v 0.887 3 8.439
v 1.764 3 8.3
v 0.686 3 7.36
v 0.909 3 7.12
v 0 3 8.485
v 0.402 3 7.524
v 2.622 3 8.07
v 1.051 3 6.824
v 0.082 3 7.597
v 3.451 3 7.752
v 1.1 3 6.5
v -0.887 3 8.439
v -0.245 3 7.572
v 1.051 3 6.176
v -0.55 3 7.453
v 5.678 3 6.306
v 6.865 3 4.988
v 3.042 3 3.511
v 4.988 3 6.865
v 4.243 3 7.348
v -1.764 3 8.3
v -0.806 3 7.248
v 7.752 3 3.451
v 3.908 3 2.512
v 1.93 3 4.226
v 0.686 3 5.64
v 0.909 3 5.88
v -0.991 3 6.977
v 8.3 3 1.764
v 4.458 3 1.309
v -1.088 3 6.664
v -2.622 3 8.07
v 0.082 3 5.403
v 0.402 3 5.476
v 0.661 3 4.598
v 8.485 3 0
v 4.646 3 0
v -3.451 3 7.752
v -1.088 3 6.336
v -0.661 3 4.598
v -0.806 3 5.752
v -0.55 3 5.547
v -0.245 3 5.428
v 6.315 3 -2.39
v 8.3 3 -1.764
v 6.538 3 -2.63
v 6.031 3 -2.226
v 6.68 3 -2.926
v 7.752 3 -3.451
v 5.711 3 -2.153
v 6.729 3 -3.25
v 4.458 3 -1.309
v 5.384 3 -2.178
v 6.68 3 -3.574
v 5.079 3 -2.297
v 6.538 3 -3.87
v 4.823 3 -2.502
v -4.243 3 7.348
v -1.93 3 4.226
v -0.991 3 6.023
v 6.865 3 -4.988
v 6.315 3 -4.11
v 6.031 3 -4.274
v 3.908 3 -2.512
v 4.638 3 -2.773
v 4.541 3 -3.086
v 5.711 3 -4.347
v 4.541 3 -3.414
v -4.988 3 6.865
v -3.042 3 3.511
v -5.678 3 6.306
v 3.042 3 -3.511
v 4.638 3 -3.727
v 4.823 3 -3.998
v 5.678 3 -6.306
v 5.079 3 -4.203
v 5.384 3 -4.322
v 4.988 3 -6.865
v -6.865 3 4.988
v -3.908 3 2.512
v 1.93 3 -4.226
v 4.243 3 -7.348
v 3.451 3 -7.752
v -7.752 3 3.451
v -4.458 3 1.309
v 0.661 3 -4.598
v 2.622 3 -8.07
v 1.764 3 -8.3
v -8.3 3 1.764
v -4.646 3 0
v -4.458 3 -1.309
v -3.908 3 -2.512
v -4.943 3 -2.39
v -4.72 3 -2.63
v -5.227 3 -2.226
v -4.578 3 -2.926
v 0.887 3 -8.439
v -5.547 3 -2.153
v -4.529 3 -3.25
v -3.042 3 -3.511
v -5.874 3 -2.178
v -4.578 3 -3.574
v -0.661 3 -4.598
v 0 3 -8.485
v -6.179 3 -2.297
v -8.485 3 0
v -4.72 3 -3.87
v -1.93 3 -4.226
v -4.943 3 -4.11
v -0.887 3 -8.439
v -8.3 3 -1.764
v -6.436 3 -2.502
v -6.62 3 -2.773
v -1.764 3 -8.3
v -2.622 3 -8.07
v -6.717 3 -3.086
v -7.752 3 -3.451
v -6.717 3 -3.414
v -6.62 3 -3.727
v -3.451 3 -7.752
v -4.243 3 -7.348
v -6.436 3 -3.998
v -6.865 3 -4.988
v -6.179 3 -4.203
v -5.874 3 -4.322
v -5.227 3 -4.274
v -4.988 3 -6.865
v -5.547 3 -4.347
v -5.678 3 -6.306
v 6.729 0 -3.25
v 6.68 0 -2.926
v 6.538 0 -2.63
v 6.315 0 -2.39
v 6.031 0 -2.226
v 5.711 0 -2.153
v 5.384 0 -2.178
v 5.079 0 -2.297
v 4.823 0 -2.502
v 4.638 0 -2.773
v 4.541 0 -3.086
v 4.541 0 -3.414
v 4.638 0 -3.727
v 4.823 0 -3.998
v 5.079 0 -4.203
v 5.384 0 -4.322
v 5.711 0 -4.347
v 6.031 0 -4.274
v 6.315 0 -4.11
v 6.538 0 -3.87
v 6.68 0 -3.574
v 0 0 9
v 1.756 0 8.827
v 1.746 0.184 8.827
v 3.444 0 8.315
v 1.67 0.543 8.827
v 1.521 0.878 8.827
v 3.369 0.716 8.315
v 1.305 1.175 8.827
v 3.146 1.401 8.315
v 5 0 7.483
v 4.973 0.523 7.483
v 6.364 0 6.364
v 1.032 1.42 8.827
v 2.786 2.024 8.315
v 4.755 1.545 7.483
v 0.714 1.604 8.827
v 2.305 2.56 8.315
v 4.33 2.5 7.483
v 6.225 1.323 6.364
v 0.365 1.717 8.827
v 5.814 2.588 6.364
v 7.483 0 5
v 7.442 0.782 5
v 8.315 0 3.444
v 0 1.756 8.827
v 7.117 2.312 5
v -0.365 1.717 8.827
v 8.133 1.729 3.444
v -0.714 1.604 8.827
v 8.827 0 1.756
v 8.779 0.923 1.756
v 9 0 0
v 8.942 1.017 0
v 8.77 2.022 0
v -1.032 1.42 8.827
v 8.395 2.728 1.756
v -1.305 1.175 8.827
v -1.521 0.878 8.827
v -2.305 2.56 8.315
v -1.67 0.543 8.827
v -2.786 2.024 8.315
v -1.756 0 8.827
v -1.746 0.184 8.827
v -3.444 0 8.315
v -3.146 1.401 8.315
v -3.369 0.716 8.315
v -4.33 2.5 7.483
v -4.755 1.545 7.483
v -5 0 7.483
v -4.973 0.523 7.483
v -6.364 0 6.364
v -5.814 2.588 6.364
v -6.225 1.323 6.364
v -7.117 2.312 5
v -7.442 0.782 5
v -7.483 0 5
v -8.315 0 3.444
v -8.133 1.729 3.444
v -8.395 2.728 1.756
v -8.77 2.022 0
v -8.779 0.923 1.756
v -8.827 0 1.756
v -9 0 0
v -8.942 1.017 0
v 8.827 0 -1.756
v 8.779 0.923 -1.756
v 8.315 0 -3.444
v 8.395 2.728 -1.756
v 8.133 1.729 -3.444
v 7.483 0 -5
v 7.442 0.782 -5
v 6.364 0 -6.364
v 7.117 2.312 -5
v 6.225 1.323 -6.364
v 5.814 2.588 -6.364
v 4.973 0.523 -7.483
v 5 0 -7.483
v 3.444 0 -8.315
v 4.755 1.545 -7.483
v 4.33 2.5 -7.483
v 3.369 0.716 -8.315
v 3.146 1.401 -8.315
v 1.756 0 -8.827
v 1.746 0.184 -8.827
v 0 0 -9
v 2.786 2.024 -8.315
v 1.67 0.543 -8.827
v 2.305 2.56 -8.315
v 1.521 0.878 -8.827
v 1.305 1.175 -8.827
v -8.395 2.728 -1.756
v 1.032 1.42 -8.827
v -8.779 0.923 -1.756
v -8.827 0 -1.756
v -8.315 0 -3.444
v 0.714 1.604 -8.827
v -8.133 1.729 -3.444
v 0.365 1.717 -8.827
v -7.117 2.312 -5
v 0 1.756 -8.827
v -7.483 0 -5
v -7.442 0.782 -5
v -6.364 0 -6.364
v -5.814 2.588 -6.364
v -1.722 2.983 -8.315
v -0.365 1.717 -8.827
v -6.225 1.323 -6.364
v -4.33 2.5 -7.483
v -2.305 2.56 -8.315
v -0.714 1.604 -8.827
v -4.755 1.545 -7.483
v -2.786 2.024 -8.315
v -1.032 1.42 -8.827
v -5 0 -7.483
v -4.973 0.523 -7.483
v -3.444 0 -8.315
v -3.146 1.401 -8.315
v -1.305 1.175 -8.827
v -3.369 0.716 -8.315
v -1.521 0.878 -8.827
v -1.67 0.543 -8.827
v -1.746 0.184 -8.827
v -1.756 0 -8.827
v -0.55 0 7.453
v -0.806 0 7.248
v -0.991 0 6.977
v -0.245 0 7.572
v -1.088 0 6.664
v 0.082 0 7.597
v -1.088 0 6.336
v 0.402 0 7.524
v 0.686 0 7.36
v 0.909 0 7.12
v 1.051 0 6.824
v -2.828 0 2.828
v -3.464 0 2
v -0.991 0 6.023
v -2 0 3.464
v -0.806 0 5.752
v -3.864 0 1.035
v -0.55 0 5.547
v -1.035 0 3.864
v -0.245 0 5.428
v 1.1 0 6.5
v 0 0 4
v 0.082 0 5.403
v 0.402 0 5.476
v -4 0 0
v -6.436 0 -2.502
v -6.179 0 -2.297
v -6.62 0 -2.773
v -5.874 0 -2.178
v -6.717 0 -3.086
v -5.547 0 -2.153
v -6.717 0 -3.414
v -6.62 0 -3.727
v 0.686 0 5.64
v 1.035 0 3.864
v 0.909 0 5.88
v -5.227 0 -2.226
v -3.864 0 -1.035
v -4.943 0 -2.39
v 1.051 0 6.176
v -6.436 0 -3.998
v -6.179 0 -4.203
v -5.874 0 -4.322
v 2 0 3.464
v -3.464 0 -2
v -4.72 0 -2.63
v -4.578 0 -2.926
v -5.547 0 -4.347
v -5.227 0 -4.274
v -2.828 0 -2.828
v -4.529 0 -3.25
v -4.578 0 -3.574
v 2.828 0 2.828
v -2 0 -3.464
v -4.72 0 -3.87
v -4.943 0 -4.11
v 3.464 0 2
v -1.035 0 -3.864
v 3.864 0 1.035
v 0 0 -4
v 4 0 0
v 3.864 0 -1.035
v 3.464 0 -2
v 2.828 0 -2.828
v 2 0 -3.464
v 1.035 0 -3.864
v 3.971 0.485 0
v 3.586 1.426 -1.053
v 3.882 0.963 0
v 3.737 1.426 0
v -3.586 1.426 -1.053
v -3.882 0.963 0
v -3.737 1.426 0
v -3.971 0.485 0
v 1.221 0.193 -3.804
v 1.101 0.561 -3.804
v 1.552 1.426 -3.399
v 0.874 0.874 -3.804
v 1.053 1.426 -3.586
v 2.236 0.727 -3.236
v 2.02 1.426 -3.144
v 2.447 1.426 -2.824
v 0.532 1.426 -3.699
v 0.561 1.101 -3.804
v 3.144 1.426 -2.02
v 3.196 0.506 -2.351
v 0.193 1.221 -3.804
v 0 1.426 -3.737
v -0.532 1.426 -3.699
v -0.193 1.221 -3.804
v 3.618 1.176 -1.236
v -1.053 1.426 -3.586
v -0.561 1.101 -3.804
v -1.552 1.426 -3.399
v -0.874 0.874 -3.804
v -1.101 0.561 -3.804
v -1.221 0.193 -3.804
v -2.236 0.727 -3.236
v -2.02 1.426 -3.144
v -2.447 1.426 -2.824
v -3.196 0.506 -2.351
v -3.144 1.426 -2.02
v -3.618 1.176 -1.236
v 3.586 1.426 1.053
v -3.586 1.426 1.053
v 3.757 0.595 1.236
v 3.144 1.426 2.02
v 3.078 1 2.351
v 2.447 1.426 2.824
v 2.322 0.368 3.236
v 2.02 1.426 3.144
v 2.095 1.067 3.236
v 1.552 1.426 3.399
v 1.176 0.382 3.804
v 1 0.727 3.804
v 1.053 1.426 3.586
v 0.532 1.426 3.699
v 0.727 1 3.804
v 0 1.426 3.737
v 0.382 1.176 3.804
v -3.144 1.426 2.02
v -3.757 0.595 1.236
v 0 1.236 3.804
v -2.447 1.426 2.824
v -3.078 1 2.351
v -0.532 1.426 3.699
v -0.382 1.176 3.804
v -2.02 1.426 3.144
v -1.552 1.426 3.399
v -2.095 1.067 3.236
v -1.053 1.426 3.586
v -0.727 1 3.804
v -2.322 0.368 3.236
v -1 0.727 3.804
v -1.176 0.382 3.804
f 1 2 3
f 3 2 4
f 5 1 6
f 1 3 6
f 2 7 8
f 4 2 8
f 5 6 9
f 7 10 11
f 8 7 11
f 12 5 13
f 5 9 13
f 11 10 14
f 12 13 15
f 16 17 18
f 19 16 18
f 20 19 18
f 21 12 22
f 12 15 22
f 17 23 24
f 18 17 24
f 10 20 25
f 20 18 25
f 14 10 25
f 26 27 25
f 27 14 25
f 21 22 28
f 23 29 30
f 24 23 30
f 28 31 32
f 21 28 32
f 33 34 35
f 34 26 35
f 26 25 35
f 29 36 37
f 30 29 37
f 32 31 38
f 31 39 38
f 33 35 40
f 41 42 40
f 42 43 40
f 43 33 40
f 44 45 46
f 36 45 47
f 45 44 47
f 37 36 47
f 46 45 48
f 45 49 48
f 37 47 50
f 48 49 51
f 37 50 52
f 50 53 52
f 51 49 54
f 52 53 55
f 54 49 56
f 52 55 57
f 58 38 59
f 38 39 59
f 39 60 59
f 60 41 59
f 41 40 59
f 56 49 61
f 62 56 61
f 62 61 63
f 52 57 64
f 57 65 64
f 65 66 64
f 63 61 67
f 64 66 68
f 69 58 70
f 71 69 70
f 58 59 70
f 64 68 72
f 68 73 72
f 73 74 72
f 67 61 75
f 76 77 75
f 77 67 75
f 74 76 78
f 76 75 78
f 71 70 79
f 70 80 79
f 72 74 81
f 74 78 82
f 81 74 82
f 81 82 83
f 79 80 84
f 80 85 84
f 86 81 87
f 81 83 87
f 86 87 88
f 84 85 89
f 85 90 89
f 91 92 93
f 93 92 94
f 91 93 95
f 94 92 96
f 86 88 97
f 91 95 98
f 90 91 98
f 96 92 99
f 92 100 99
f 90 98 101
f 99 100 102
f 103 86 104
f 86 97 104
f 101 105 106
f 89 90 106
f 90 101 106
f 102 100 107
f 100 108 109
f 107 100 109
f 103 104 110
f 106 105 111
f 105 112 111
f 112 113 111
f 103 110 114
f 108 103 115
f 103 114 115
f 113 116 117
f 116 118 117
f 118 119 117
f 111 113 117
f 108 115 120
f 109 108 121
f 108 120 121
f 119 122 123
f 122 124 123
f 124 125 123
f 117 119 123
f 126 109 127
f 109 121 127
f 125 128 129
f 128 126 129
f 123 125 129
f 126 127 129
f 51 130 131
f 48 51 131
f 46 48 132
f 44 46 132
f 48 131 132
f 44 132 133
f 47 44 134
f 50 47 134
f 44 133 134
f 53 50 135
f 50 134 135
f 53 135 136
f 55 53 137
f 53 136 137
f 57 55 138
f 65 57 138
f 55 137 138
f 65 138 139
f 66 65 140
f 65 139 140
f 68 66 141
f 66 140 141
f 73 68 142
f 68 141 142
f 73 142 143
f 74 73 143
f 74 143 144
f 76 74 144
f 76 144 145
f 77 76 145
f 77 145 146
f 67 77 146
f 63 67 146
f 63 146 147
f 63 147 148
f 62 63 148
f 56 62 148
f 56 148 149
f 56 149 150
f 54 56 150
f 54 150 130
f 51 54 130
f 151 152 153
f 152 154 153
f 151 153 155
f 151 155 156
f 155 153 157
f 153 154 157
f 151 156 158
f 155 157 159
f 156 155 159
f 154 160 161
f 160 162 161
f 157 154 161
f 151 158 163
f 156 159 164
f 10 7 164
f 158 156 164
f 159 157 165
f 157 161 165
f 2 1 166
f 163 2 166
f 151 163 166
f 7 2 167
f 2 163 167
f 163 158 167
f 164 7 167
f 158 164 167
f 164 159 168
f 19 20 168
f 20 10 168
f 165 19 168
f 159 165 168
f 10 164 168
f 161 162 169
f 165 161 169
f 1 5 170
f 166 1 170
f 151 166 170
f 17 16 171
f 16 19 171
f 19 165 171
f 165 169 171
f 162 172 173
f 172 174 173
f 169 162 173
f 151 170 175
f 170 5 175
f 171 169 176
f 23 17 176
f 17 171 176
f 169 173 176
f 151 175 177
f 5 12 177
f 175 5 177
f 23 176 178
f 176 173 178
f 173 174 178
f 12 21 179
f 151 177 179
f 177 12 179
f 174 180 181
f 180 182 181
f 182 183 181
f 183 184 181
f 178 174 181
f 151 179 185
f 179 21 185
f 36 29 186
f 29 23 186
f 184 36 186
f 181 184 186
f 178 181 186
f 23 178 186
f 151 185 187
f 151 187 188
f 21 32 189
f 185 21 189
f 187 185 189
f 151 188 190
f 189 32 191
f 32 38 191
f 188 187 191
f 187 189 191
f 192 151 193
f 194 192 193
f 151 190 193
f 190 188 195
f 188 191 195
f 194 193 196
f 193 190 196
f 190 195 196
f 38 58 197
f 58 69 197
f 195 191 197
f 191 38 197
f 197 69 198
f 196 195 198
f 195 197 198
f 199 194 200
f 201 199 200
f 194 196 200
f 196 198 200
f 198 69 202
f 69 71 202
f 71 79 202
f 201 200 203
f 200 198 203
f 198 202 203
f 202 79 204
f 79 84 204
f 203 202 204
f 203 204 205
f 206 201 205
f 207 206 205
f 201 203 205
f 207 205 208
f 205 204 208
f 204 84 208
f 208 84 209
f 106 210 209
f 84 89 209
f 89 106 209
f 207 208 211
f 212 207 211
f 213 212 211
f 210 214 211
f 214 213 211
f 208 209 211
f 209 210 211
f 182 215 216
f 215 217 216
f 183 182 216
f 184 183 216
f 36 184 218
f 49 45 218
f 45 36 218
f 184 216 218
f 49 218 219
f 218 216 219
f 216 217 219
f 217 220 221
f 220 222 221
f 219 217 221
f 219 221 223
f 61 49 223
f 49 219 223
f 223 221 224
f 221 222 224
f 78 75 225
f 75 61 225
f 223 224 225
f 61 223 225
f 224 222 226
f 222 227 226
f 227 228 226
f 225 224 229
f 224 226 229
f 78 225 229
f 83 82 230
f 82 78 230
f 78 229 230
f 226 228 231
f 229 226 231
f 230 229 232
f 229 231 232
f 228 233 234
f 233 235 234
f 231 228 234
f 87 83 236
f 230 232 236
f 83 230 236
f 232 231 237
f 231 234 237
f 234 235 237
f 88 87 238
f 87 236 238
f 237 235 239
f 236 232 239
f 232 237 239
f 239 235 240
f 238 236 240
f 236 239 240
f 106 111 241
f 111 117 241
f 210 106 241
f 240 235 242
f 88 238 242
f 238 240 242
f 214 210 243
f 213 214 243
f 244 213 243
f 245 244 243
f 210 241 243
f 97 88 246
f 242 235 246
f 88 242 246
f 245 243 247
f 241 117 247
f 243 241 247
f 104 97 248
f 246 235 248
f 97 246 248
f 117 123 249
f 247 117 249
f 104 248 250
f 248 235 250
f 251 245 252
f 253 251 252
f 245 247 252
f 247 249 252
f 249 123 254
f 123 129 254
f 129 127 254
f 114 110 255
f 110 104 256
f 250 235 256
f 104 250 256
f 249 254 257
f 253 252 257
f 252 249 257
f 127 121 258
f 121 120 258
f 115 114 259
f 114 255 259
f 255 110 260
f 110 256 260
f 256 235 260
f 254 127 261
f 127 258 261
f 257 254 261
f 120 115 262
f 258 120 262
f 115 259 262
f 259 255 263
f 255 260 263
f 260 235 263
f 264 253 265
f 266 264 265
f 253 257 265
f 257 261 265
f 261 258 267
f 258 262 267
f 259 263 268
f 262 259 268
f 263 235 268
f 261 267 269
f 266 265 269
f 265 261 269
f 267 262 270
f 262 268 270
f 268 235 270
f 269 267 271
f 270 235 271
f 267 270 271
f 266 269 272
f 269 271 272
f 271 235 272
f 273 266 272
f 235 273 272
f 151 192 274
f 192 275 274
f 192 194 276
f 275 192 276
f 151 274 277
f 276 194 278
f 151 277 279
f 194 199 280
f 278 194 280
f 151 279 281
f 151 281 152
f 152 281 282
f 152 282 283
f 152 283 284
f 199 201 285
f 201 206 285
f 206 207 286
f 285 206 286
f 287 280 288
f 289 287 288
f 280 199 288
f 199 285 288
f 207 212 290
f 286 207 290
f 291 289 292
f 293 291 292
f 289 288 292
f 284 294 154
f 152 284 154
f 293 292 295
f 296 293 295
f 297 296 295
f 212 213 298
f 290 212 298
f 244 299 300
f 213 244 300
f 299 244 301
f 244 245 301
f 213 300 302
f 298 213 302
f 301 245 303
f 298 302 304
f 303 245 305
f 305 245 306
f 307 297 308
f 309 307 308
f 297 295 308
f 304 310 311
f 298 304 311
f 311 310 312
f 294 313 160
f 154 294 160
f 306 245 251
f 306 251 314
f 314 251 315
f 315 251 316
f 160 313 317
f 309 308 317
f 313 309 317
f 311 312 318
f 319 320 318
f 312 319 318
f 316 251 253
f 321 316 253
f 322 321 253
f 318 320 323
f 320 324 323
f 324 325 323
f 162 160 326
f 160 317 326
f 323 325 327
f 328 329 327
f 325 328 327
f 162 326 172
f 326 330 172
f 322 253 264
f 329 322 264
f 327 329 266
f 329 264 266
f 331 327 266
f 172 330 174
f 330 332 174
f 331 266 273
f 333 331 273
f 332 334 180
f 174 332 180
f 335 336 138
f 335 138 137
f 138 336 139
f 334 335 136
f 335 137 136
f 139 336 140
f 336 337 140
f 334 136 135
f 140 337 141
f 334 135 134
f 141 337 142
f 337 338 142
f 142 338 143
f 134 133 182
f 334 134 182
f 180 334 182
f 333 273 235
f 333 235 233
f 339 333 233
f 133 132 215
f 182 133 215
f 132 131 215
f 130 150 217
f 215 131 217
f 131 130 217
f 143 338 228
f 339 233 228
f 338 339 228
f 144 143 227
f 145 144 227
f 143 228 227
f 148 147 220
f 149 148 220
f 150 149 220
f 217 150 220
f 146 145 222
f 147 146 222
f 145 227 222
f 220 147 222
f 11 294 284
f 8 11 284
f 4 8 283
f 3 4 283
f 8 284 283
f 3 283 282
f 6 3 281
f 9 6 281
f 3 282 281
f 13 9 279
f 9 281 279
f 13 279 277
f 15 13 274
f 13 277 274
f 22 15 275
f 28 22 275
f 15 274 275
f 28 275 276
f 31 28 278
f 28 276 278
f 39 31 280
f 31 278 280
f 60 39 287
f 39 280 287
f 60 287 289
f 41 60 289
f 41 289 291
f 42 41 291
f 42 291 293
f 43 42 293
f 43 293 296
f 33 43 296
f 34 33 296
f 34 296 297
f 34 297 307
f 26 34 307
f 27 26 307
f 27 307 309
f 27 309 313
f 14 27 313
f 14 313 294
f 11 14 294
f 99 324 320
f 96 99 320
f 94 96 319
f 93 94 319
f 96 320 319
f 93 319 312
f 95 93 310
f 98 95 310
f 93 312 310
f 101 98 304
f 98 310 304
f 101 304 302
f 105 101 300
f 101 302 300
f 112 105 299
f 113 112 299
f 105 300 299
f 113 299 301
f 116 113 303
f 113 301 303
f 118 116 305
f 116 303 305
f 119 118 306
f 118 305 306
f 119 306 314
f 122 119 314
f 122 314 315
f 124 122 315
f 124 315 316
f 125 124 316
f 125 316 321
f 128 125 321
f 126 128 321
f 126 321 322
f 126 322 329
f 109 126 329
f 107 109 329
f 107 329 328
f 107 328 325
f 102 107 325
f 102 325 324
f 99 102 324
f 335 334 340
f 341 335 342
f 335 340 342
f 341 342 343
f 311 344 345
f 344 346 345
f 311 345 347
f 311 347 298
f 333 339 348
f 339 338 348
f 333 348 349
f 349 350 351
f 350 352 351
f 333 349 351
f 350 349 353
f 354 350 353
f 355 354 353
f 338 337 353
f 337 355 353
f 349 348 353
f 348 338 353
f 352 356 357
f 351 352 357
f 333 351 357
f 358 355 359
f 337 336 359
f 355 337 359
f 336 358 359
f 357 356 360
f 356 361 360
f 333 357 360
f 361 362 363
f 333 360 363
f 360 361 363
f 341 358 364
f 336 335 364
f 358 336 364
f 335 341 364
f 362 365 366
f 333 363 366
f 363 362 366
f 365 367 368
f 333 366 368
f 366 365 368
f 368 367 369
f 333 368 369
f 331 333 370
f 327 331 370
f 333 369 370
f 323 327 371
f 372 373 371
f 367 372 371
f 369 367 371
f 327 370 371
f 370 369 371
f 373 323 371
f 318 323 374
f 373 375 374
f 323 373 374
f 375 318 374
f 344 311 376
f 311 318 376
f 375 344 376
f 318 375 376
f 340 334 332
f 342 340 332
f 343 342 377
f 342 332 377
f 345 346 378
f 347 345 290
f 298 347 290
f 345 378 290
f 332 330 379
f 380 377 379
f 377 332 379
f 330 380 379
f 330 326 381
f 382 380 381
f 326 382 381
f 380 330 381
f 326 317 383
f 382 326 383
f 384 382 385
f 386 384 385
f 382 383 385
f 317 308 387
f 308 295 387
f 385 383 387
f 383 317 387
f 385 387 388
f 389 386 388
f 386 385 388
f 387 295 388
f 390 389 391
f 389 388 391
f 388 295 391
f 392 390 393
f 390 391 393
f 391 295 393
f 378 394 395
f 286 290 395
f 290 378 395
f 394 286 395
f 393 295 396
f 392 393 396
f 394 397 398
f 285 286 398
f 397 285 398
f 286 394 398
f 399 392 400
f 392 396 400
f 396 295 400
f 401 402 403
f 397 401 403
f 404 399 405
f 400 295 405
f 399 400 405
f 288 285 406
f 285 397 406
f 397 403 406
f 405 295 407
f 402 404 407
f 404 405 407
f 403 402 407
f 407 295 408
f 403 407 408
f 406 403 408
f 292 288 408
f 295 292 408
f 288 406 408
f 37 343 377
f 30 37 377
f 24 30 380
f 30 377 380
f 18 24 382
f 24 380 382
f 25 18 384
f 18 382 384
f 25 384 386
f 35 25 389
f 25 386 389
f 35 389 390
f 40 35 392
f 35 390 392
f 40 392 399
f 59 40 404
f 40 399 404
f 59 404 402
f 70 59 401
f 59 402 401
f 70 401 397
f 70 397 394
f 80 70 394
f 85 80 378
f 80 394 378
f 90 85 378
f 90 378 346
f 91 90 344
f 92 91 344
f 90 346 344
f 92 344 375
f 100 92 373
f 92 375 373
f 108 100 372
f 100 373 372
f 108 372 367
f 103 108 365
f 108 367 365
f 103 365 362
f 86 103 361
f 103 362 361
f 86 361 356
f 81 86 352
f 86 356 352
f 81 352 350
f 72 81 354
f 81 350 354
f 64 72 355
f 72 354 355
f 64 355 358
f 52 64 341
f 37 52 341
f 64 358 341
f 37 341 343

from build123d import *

# Parameters (mm, degrees)
REVOLVE1_ANGLE     = 180
CHAMFER2_SIZE      = 2
SKETCH2_R          = 1.1
CUT_EXTRUDE1_DEPTH = 10


# Read off the part's stored shape, not the designer's step: Body-Delete/Keep 1
with BuildPart() as part:
    # Sketch1 → Revolve1 (revolve)
    with BuildSketch(Plane(origin=(0, 0, 0), x_dir=(1, 0, 0), z_dir=(0, 1, 0))):
        with BuildLine():
            ThreePointArc((9, 0), (6.363961031, 6.363961031), (0, 9))
            Line((0, 9), (0, 4))
            ThreePointArc((0, 4), (2.828427125, 2.828427125), (4, 0))
            ThreePointArc((4, 0), (2.828427125, -2.828427125), (0, -4))
            Line((0, -4), (0, -9))
            ThreePointArc((0, -9), (6.363961031, -6.363961031), (9, 0))
        make_face()
    revolve(axis=Axis((0, 0, -9), (0, 0, 1)), revolution_arc=REVOLVE1_ANGLE)


with BuildPart() as body_2:
    # Split1: the piece on the far side of the plane
    add(part.part)
    split(bisect_by=Plane(origin=(0, 3, 0), x_dir=(-1, 0, 0), z_dir=(0, -1, 0)), keep=Keep.BOTTOM)


with BuildPart() as part_1:
    add(part.part)

    # Split1
    split(bisect_by=Plane(origin=(0, 3, 0), x_dir=(-1, 0, 0), z_dir=(0, -1, 0)), keep=Keep.TOP)

    # Chamfer2
    # the kernel refuses this chamfer: 2, 1.766969722 mm, written as the material it takes off along each edge
    with BuildSketch(Plane(origin=(0, 3, 0), x_dir=(1, 0, 0), z_dir=(0, 0, -1))) as chamfer2_piece_1:
        with BuildLine():
            Line((2.645751311 + CHAMFER2_SIZE, 0), (3.73710994, 1.573813021))
            ThreePointArc((3.73710994, 1.573813021), (3.297092522, 0.735230497), (2.645751311, 0))
            Line((2.645751311, 0), (2.645751311 + CHAMFER2_SIZE, 0))
        make_face()
    revolve(axis=Axis((0, 3, 0), (0, -1, 0)), mode=Mode.SUBTRACT)

    # Sketch2 → Cut-Extrude1 (cut)
    with BuildSketch(Plane.XZ):
        with Locations((0, 6.5)):
            Circle(SKETCH2_R)
        with Locations((5.629165125, -3.25)):
            Circle(SKETCH2_R)
        with Locations((-5.629165125, -3.25)):
            Circle(SKETCH2_R)
    extrude(amount=-CUT_EXTRUDE1_DEPTH, mode=Mode.SUBTRACT)


solid = part_1.part
